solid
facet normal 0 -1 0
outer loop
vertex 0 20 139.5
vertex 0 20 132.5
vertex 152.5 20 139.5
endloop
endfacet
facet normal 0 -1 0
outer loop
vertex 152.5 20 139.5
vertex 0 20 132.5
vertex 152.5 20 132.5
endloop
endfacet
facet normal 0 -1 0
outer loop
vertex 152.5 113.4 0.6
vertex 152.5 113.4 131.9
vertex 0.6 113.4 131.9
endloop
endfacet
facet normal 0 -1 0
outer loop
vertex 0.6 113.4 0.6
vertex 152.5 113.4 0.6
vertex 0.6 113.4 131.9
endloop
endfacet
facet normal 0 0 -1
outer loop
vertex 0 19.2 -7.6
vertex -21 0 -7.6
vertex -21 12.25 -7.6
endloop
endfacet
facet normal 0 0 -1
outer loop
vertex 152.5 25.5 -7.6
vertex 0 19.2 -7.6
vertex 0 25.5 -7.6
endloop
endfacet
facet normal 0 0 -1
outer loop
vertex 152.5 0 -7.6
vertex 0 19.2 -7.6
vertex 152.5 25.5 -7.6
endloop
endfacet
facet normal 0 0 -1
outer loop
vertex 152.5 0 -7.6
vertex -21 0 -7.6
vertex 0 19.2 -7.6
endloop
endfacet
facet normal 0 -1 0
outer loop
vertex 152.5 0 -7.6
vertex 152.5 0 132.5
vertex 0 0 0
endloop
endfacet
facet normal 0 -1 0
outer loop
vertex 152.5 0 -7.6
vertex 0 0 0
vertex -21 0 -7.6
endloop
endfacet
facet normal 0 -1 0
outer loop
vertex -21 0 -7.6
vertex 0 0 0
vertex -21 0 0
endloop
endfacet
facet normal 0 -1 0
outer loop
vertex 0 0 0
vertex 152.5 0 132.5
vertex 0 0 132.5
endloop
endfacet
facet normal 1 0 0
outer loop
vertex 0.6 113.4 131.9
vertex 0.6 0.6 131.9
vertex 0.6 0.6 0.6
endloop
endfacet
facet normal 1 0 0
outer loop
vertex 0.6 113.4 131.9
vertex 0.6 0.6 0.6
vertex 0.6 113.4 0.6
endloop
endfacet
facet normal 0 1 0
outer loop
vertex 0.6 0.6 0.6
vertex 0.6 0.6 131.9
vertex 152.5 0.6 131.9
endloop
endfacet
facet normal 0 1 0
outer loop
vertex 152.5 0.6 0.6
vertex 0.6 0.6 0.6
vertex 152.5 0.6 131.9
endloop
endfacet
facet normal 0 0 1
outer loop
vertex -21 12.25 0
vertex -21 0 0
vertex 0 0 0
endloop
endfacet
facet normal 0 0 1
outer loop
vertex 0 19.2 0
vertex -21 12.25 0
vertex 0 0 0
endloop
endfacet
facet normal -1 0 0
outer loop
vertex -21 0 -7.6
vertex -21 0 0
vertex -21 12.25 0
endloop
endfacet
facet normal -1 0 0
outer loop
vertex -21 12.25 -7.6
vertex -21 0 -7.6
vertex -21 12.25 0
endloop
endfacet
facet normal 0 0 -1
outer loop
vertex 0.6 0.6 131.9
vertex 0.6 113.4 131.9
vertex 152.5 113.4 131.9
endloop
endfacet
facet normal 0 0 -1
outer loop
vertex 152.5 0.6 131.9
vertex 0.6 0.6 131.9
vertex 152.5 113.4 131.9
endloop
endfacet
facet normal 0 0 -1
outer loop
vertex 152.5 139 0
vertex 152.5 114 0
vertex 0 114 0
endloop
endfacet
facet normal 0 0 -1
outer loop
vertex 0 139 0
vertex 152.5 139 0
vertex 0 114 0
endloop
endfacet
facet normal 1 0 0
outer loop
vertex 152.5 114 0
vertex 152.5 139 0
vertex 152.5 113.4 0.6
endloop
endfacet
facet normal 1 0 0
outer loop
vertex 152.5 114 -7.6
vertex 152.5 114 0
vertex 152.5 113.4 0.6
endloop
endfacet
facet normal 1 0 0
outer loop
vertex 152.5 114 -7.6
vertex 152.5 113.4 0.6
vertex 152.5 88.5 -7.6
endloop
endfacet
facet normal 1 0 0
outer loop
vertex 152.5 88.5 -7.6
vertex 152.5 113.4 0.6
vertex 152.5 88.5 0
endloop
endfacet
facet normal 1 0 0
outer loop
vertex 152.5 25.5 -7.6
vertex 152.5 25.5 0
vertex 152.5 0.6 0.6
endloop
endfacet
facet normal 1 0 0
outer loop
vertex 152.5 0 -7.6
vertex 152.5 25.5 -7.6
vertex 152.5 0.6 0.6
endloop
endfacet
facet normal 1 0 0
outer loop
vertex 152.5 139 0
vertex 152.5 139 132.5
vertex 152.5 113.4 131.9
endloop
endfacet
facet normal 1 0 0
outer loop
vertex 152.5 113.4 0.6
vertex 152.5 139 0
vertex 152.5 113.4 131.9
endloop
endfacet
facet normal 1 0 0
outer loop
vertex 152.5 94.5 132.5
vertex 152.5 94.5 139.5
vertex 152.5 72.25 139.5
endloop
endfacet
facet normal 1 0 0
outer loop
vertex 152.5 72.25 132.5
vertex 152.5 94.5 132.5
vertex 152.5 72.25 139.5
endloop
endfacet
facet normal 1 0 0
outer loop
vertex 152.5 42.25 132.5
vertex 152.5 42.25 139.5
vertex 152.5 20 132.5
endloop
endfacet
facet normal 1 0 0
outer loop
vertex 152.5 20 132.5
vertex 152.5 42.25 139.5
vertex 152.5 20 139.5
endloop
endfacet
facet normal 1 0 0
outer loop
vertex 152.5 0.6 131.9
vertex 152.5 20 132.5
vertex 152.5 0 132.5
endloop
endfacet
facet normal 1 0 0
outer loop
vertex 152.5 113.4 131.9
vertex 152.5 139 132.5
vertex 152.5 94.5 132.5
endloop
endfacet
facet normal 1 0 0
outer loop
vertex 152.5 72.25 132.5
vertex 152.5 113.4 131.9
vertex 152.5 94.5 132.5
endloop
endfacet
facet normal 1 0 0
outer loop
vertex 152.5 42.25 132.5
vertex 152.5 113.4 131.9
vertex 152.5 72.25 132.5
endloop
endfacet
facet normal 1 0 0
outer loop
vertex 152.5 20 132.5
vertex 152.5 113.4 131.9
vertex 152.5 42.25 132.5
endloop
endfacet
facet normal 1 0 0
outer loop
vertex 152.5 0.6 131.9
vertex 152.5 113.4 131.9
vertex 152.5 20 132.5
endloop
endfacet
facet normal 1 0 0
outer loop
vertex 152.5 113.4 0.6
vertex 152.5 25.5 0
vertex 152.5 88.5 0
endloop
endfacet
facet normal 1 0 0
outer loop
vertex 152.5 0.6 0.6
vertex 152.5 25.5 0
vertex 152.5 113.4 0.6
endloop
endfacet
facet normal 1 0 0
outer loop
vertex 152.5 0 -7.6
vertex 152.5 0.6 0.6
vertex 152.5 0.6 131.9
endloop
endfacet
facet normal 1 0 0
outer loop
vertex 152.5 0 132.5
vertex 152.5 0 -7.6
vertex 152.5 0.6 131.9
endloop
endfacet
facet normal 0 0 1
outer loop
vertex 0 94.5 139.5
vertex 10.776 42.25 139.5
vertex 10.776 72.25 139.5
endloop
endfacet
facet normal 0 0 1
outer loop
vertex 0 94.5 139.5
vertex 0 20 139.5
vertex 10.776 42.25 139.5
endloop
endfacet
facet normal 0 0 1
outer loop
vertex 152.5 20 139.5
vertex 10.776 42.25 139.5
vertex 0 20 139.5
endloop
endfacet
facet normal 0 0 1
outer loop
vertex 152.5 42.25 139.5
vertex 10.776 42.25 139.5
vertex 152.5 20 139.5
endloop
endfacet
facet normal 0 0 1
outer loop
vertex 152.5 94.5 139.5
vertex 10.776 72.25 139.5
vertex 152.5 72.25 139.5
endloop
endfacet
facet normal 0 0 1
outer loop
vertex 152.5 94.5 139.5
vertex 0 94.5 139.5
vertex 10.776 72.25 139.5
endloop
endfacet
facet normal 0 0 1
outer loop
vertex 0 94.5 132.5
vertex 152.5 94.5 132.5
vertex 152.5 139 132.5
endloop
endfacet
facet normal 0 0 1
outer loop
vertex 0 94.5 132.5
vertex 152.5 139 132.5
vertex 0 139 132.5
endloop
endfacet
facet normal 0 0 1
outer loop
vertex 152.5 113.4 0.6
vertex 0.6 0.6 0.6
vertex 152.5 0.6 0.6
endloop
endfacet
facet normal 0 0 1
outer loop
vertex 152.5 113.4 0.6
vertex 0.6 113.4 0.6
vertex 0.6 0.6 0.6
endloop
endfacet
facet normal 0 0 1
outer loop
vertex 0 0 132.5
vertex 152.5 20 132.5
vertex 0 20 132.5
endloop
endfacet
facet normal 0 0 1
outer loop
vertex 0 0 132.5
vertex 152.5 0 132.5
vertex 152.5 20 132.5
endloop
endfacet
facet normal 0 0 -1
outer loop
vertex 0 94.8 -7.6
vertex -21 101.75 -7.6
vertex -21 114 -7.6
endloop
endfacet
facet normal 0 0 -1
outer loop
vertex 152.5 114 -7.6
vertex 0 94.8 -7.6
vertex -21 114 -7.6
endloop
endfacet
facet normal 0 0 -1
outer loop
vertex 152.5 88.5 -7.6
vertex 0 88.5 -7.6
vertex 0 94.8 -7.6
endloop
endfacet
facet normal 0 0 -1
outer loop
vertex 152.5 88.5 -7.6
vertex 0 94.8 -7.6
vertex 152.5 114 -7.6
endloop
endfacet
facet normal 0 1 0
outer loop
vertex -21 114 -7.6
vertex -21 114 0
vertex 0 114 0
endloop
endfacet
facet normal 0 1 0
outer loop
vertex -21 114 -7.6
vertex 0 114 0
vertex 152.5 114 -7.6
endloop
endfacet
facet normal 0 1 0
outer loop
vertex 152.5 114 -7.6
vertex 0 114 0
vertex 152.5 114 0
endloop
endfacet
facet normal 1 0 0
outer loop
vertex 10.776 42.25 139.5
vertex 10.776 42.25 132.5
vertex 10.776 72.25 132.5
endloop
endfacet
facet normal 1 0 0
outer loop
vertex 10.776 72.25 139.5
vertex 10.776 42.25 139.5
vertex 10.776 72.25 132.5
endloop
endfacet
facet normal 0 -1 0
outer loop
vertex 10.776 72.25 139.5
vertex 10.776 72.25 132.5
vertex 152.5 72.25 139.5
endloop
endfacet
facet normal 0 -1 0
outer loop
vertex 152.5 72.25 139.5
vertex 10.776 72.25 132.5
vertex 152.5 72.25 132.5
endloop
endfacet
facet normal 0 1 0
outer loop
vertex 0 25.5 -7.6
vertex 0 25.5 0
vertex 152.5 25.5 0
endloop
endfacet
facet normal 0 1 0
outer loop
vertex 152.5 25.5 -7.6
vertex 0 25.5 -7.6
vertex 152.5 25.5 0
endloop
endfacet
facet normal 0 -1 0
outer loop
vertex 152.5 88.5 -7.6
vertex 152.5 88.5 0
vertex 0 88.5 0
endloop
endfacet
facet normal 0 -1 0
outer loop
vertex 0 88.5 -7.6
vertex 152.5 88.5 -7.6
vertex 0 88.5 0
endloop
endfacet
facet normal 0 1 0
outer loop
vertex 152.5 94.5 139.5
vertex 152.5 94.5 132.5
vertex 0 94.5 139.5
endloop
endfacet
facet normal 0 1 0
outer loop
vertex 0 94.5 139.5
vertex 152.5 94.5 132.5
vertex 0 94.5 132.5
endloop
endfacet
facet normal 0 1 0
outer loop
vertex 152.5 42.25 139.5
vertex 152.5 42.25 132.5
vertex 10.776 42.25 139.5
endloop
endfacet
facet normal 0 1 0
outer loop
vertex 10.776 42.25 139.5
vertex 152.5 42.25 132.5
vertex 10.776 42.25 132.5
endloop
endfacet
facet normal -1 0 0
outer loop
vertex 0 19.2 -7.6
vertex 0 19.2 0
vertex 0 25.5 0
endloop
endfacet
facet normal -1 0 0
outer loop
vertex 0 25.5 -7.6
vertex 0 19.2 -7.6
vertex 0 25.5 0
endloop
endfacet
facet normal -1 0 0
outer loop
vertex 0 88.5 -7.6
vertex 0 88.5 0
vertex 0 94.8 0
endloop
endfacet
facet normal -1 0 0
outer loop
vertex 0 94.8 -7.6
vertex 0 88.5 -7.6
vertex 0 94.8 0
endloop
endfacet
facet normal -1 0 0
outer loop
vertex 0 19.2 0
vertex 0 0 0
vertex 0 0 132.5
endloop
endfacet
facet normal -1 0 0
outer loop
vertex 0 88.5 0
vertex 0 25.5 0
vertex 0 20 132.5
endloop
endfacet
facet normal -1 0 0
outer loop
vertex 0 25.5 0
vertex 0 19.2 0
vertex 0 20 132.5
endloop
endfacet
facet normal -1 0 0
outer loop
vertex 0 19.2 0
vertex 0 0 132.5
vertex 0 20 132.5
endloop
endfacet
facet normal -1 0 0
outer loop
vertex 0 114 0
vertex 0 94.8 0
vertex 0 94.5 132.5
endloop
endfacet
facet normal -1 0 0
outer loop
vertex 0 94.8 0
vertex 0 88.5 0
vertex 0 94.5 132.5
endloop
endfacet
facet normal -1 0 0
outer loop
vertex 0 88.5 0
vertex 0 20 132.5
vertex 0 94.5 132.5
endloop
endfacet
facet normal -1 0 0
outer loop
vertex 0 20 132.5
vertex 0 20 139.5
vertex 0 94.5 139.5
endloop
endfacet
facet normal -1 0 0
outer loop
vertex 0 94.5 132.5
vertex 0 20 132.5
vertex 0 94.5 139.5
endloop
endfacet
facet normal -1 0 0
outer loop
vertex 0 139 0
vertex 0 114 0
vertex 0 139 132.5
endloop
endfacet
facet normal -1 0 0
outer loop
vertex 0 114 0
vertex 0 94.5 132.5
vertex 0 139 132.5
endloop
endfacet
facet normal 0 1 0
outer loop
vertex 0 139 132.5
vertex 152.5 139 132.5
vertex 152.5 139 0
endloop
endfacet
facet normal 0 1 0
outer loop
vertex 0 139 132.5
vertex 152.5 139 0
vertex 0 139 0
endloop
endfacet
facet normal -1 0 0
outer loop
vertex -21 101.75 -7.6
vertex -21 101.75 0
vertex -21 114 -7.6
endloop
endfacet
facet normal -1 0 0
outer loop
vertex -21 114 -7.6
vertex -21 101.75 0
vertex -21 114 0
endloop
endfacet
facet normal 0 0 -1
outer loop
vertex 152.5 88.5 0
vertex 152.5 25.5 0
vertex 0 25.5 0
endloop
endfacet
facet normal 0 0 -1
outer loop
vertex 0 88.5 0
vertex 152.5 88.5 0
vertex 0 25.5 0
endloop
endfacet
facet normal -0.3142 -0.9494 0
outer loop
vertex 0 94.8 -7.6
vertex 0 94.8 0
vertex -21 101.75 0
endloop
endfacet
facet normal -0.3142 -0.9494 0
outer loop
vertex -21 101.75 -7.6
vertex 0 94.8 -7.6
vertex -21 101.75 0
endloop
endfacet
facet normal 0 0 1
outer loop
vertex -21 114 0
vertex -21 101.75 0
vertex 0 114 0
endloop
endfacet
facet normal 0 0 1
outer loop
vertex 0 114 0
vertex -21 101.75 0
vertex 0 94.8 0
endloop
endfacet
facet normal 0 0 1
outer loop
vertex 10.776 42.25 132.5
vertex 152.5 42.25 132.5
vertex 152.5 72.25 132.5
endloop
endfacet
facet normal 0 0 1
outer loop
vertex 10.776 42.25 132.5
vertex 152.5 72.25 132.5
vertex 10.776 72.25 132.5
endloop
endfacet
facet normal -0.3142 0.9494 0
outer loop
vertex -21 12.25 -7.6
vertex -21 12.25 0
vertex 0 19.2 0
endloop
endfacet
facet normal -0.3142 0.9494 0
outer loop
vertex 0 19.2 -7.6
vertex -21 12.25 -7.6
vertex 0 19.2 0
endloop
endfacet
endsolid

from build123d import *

# Parameters (mm, degrees)
F6_W      = 114
F6_H      = 132.5
F7_DEPTH  = 0.6
F5_W      = 152.5
F5_H      = 114
F9_DEPTH  = 0.6
F1_W      = 152.5
F1_H      = 132.5
F10_DEPTH = 0.6
F3_W      = 152.5
F3_H      = 132.5
F11_DEPTH = 0.6
F0_W      = 152.5
F0_H      = 114
F12_DEPTH = 0.6
F13_W     = 152.5
F13_H     = 132.5
F14_DEPTH = 25
F16_DEPTH = 7
F18_DEPTH = 7.6


with BuildPart() as f7:
    # F6 (on Right) → F7 (new body)
    with BuildSketch(Plane.YZ):
        with Locations((57, 66.25)):
            Rectangle(F6_W, F6_H)
    extrude(amount=F7_DEPTH)

    # F5 (on line) → F9 (join)
    with BuildSketch(Plane.XY.offset(132.5)):
        with Locations((76.25, 57)):
            Rectangle(F5_W, F5_H)
    extrude(amount=-F9_DEPTH)

    # F1 (on Front) → F10 (join)
    with BuildSketch(Plane.XZ):
        with Locations((76.25, 66.25)):
            Rectangle(F1_W, F1_H)
    extrude(amount=-F10_DEPTH)

    # F3 (on line) → F11 (join)
    with BuildSketch(Plane(origin=(0, 114, 0), x_dir=(-1, 0, 0), z_dir=(0, 1, 0))):
        with Locations((-76.25, 66.25)):
            Rectangle(F3_W, F3_H)
    extrude(amount=-F11_DEPTH)

    # F0 (on Top) → F12 (join)
    with BuildSketch(Plane.XY):
        with Locations((76.25, 57)):
            Rectangle(F0_W, F0_H)
    extrude(amount=F12_DEPTH)

    # F13 (on face) → F14 (join)
    with BuildSketch(Plane(origin=(0, 114, 0), x_dir=(-1, 0, 0), z_dir=(0, 1, 0))):
        with Locations((-76.25, 66.25)):
            Rectangle(F13_W, F13_H)
    extrude(amount=F14_DEPTH)

    # F15 (on face) → F16 (join)
    with BuildSketch(Plane.XY.offset(132.5)):
        Polygon((0, 94.5), (0, 20), (152.5, 20), (152.5, 42.25), (10.7762217522, 42.25), (10.7762217522, 72.25), (152.5, 72.25), (152.5, 94.5), align=None)
    extrude(amount=F16_DEPTH)

    # F17 (on face) → F18 (join)
    with BuildSketch(Plane(origin=(0, 0, 0), x_dir=(1, 0, 0), z_dir=(0, 0, -1))):
        Polygon((152.5, -25.5), (152.5, 0), (0, 0), (-21, 0), (-21, -12.25), (0, -19.2), (0, -25.5), align=None)
        Polygon((0, -114), (152.5, -114), (152.5, -88.5), (0, -88.5), (0, -94.8), (-21, -101.75), (-21, -114), align=None)
    extrude(amount=F18_DEPTH)


solid = f7.part
